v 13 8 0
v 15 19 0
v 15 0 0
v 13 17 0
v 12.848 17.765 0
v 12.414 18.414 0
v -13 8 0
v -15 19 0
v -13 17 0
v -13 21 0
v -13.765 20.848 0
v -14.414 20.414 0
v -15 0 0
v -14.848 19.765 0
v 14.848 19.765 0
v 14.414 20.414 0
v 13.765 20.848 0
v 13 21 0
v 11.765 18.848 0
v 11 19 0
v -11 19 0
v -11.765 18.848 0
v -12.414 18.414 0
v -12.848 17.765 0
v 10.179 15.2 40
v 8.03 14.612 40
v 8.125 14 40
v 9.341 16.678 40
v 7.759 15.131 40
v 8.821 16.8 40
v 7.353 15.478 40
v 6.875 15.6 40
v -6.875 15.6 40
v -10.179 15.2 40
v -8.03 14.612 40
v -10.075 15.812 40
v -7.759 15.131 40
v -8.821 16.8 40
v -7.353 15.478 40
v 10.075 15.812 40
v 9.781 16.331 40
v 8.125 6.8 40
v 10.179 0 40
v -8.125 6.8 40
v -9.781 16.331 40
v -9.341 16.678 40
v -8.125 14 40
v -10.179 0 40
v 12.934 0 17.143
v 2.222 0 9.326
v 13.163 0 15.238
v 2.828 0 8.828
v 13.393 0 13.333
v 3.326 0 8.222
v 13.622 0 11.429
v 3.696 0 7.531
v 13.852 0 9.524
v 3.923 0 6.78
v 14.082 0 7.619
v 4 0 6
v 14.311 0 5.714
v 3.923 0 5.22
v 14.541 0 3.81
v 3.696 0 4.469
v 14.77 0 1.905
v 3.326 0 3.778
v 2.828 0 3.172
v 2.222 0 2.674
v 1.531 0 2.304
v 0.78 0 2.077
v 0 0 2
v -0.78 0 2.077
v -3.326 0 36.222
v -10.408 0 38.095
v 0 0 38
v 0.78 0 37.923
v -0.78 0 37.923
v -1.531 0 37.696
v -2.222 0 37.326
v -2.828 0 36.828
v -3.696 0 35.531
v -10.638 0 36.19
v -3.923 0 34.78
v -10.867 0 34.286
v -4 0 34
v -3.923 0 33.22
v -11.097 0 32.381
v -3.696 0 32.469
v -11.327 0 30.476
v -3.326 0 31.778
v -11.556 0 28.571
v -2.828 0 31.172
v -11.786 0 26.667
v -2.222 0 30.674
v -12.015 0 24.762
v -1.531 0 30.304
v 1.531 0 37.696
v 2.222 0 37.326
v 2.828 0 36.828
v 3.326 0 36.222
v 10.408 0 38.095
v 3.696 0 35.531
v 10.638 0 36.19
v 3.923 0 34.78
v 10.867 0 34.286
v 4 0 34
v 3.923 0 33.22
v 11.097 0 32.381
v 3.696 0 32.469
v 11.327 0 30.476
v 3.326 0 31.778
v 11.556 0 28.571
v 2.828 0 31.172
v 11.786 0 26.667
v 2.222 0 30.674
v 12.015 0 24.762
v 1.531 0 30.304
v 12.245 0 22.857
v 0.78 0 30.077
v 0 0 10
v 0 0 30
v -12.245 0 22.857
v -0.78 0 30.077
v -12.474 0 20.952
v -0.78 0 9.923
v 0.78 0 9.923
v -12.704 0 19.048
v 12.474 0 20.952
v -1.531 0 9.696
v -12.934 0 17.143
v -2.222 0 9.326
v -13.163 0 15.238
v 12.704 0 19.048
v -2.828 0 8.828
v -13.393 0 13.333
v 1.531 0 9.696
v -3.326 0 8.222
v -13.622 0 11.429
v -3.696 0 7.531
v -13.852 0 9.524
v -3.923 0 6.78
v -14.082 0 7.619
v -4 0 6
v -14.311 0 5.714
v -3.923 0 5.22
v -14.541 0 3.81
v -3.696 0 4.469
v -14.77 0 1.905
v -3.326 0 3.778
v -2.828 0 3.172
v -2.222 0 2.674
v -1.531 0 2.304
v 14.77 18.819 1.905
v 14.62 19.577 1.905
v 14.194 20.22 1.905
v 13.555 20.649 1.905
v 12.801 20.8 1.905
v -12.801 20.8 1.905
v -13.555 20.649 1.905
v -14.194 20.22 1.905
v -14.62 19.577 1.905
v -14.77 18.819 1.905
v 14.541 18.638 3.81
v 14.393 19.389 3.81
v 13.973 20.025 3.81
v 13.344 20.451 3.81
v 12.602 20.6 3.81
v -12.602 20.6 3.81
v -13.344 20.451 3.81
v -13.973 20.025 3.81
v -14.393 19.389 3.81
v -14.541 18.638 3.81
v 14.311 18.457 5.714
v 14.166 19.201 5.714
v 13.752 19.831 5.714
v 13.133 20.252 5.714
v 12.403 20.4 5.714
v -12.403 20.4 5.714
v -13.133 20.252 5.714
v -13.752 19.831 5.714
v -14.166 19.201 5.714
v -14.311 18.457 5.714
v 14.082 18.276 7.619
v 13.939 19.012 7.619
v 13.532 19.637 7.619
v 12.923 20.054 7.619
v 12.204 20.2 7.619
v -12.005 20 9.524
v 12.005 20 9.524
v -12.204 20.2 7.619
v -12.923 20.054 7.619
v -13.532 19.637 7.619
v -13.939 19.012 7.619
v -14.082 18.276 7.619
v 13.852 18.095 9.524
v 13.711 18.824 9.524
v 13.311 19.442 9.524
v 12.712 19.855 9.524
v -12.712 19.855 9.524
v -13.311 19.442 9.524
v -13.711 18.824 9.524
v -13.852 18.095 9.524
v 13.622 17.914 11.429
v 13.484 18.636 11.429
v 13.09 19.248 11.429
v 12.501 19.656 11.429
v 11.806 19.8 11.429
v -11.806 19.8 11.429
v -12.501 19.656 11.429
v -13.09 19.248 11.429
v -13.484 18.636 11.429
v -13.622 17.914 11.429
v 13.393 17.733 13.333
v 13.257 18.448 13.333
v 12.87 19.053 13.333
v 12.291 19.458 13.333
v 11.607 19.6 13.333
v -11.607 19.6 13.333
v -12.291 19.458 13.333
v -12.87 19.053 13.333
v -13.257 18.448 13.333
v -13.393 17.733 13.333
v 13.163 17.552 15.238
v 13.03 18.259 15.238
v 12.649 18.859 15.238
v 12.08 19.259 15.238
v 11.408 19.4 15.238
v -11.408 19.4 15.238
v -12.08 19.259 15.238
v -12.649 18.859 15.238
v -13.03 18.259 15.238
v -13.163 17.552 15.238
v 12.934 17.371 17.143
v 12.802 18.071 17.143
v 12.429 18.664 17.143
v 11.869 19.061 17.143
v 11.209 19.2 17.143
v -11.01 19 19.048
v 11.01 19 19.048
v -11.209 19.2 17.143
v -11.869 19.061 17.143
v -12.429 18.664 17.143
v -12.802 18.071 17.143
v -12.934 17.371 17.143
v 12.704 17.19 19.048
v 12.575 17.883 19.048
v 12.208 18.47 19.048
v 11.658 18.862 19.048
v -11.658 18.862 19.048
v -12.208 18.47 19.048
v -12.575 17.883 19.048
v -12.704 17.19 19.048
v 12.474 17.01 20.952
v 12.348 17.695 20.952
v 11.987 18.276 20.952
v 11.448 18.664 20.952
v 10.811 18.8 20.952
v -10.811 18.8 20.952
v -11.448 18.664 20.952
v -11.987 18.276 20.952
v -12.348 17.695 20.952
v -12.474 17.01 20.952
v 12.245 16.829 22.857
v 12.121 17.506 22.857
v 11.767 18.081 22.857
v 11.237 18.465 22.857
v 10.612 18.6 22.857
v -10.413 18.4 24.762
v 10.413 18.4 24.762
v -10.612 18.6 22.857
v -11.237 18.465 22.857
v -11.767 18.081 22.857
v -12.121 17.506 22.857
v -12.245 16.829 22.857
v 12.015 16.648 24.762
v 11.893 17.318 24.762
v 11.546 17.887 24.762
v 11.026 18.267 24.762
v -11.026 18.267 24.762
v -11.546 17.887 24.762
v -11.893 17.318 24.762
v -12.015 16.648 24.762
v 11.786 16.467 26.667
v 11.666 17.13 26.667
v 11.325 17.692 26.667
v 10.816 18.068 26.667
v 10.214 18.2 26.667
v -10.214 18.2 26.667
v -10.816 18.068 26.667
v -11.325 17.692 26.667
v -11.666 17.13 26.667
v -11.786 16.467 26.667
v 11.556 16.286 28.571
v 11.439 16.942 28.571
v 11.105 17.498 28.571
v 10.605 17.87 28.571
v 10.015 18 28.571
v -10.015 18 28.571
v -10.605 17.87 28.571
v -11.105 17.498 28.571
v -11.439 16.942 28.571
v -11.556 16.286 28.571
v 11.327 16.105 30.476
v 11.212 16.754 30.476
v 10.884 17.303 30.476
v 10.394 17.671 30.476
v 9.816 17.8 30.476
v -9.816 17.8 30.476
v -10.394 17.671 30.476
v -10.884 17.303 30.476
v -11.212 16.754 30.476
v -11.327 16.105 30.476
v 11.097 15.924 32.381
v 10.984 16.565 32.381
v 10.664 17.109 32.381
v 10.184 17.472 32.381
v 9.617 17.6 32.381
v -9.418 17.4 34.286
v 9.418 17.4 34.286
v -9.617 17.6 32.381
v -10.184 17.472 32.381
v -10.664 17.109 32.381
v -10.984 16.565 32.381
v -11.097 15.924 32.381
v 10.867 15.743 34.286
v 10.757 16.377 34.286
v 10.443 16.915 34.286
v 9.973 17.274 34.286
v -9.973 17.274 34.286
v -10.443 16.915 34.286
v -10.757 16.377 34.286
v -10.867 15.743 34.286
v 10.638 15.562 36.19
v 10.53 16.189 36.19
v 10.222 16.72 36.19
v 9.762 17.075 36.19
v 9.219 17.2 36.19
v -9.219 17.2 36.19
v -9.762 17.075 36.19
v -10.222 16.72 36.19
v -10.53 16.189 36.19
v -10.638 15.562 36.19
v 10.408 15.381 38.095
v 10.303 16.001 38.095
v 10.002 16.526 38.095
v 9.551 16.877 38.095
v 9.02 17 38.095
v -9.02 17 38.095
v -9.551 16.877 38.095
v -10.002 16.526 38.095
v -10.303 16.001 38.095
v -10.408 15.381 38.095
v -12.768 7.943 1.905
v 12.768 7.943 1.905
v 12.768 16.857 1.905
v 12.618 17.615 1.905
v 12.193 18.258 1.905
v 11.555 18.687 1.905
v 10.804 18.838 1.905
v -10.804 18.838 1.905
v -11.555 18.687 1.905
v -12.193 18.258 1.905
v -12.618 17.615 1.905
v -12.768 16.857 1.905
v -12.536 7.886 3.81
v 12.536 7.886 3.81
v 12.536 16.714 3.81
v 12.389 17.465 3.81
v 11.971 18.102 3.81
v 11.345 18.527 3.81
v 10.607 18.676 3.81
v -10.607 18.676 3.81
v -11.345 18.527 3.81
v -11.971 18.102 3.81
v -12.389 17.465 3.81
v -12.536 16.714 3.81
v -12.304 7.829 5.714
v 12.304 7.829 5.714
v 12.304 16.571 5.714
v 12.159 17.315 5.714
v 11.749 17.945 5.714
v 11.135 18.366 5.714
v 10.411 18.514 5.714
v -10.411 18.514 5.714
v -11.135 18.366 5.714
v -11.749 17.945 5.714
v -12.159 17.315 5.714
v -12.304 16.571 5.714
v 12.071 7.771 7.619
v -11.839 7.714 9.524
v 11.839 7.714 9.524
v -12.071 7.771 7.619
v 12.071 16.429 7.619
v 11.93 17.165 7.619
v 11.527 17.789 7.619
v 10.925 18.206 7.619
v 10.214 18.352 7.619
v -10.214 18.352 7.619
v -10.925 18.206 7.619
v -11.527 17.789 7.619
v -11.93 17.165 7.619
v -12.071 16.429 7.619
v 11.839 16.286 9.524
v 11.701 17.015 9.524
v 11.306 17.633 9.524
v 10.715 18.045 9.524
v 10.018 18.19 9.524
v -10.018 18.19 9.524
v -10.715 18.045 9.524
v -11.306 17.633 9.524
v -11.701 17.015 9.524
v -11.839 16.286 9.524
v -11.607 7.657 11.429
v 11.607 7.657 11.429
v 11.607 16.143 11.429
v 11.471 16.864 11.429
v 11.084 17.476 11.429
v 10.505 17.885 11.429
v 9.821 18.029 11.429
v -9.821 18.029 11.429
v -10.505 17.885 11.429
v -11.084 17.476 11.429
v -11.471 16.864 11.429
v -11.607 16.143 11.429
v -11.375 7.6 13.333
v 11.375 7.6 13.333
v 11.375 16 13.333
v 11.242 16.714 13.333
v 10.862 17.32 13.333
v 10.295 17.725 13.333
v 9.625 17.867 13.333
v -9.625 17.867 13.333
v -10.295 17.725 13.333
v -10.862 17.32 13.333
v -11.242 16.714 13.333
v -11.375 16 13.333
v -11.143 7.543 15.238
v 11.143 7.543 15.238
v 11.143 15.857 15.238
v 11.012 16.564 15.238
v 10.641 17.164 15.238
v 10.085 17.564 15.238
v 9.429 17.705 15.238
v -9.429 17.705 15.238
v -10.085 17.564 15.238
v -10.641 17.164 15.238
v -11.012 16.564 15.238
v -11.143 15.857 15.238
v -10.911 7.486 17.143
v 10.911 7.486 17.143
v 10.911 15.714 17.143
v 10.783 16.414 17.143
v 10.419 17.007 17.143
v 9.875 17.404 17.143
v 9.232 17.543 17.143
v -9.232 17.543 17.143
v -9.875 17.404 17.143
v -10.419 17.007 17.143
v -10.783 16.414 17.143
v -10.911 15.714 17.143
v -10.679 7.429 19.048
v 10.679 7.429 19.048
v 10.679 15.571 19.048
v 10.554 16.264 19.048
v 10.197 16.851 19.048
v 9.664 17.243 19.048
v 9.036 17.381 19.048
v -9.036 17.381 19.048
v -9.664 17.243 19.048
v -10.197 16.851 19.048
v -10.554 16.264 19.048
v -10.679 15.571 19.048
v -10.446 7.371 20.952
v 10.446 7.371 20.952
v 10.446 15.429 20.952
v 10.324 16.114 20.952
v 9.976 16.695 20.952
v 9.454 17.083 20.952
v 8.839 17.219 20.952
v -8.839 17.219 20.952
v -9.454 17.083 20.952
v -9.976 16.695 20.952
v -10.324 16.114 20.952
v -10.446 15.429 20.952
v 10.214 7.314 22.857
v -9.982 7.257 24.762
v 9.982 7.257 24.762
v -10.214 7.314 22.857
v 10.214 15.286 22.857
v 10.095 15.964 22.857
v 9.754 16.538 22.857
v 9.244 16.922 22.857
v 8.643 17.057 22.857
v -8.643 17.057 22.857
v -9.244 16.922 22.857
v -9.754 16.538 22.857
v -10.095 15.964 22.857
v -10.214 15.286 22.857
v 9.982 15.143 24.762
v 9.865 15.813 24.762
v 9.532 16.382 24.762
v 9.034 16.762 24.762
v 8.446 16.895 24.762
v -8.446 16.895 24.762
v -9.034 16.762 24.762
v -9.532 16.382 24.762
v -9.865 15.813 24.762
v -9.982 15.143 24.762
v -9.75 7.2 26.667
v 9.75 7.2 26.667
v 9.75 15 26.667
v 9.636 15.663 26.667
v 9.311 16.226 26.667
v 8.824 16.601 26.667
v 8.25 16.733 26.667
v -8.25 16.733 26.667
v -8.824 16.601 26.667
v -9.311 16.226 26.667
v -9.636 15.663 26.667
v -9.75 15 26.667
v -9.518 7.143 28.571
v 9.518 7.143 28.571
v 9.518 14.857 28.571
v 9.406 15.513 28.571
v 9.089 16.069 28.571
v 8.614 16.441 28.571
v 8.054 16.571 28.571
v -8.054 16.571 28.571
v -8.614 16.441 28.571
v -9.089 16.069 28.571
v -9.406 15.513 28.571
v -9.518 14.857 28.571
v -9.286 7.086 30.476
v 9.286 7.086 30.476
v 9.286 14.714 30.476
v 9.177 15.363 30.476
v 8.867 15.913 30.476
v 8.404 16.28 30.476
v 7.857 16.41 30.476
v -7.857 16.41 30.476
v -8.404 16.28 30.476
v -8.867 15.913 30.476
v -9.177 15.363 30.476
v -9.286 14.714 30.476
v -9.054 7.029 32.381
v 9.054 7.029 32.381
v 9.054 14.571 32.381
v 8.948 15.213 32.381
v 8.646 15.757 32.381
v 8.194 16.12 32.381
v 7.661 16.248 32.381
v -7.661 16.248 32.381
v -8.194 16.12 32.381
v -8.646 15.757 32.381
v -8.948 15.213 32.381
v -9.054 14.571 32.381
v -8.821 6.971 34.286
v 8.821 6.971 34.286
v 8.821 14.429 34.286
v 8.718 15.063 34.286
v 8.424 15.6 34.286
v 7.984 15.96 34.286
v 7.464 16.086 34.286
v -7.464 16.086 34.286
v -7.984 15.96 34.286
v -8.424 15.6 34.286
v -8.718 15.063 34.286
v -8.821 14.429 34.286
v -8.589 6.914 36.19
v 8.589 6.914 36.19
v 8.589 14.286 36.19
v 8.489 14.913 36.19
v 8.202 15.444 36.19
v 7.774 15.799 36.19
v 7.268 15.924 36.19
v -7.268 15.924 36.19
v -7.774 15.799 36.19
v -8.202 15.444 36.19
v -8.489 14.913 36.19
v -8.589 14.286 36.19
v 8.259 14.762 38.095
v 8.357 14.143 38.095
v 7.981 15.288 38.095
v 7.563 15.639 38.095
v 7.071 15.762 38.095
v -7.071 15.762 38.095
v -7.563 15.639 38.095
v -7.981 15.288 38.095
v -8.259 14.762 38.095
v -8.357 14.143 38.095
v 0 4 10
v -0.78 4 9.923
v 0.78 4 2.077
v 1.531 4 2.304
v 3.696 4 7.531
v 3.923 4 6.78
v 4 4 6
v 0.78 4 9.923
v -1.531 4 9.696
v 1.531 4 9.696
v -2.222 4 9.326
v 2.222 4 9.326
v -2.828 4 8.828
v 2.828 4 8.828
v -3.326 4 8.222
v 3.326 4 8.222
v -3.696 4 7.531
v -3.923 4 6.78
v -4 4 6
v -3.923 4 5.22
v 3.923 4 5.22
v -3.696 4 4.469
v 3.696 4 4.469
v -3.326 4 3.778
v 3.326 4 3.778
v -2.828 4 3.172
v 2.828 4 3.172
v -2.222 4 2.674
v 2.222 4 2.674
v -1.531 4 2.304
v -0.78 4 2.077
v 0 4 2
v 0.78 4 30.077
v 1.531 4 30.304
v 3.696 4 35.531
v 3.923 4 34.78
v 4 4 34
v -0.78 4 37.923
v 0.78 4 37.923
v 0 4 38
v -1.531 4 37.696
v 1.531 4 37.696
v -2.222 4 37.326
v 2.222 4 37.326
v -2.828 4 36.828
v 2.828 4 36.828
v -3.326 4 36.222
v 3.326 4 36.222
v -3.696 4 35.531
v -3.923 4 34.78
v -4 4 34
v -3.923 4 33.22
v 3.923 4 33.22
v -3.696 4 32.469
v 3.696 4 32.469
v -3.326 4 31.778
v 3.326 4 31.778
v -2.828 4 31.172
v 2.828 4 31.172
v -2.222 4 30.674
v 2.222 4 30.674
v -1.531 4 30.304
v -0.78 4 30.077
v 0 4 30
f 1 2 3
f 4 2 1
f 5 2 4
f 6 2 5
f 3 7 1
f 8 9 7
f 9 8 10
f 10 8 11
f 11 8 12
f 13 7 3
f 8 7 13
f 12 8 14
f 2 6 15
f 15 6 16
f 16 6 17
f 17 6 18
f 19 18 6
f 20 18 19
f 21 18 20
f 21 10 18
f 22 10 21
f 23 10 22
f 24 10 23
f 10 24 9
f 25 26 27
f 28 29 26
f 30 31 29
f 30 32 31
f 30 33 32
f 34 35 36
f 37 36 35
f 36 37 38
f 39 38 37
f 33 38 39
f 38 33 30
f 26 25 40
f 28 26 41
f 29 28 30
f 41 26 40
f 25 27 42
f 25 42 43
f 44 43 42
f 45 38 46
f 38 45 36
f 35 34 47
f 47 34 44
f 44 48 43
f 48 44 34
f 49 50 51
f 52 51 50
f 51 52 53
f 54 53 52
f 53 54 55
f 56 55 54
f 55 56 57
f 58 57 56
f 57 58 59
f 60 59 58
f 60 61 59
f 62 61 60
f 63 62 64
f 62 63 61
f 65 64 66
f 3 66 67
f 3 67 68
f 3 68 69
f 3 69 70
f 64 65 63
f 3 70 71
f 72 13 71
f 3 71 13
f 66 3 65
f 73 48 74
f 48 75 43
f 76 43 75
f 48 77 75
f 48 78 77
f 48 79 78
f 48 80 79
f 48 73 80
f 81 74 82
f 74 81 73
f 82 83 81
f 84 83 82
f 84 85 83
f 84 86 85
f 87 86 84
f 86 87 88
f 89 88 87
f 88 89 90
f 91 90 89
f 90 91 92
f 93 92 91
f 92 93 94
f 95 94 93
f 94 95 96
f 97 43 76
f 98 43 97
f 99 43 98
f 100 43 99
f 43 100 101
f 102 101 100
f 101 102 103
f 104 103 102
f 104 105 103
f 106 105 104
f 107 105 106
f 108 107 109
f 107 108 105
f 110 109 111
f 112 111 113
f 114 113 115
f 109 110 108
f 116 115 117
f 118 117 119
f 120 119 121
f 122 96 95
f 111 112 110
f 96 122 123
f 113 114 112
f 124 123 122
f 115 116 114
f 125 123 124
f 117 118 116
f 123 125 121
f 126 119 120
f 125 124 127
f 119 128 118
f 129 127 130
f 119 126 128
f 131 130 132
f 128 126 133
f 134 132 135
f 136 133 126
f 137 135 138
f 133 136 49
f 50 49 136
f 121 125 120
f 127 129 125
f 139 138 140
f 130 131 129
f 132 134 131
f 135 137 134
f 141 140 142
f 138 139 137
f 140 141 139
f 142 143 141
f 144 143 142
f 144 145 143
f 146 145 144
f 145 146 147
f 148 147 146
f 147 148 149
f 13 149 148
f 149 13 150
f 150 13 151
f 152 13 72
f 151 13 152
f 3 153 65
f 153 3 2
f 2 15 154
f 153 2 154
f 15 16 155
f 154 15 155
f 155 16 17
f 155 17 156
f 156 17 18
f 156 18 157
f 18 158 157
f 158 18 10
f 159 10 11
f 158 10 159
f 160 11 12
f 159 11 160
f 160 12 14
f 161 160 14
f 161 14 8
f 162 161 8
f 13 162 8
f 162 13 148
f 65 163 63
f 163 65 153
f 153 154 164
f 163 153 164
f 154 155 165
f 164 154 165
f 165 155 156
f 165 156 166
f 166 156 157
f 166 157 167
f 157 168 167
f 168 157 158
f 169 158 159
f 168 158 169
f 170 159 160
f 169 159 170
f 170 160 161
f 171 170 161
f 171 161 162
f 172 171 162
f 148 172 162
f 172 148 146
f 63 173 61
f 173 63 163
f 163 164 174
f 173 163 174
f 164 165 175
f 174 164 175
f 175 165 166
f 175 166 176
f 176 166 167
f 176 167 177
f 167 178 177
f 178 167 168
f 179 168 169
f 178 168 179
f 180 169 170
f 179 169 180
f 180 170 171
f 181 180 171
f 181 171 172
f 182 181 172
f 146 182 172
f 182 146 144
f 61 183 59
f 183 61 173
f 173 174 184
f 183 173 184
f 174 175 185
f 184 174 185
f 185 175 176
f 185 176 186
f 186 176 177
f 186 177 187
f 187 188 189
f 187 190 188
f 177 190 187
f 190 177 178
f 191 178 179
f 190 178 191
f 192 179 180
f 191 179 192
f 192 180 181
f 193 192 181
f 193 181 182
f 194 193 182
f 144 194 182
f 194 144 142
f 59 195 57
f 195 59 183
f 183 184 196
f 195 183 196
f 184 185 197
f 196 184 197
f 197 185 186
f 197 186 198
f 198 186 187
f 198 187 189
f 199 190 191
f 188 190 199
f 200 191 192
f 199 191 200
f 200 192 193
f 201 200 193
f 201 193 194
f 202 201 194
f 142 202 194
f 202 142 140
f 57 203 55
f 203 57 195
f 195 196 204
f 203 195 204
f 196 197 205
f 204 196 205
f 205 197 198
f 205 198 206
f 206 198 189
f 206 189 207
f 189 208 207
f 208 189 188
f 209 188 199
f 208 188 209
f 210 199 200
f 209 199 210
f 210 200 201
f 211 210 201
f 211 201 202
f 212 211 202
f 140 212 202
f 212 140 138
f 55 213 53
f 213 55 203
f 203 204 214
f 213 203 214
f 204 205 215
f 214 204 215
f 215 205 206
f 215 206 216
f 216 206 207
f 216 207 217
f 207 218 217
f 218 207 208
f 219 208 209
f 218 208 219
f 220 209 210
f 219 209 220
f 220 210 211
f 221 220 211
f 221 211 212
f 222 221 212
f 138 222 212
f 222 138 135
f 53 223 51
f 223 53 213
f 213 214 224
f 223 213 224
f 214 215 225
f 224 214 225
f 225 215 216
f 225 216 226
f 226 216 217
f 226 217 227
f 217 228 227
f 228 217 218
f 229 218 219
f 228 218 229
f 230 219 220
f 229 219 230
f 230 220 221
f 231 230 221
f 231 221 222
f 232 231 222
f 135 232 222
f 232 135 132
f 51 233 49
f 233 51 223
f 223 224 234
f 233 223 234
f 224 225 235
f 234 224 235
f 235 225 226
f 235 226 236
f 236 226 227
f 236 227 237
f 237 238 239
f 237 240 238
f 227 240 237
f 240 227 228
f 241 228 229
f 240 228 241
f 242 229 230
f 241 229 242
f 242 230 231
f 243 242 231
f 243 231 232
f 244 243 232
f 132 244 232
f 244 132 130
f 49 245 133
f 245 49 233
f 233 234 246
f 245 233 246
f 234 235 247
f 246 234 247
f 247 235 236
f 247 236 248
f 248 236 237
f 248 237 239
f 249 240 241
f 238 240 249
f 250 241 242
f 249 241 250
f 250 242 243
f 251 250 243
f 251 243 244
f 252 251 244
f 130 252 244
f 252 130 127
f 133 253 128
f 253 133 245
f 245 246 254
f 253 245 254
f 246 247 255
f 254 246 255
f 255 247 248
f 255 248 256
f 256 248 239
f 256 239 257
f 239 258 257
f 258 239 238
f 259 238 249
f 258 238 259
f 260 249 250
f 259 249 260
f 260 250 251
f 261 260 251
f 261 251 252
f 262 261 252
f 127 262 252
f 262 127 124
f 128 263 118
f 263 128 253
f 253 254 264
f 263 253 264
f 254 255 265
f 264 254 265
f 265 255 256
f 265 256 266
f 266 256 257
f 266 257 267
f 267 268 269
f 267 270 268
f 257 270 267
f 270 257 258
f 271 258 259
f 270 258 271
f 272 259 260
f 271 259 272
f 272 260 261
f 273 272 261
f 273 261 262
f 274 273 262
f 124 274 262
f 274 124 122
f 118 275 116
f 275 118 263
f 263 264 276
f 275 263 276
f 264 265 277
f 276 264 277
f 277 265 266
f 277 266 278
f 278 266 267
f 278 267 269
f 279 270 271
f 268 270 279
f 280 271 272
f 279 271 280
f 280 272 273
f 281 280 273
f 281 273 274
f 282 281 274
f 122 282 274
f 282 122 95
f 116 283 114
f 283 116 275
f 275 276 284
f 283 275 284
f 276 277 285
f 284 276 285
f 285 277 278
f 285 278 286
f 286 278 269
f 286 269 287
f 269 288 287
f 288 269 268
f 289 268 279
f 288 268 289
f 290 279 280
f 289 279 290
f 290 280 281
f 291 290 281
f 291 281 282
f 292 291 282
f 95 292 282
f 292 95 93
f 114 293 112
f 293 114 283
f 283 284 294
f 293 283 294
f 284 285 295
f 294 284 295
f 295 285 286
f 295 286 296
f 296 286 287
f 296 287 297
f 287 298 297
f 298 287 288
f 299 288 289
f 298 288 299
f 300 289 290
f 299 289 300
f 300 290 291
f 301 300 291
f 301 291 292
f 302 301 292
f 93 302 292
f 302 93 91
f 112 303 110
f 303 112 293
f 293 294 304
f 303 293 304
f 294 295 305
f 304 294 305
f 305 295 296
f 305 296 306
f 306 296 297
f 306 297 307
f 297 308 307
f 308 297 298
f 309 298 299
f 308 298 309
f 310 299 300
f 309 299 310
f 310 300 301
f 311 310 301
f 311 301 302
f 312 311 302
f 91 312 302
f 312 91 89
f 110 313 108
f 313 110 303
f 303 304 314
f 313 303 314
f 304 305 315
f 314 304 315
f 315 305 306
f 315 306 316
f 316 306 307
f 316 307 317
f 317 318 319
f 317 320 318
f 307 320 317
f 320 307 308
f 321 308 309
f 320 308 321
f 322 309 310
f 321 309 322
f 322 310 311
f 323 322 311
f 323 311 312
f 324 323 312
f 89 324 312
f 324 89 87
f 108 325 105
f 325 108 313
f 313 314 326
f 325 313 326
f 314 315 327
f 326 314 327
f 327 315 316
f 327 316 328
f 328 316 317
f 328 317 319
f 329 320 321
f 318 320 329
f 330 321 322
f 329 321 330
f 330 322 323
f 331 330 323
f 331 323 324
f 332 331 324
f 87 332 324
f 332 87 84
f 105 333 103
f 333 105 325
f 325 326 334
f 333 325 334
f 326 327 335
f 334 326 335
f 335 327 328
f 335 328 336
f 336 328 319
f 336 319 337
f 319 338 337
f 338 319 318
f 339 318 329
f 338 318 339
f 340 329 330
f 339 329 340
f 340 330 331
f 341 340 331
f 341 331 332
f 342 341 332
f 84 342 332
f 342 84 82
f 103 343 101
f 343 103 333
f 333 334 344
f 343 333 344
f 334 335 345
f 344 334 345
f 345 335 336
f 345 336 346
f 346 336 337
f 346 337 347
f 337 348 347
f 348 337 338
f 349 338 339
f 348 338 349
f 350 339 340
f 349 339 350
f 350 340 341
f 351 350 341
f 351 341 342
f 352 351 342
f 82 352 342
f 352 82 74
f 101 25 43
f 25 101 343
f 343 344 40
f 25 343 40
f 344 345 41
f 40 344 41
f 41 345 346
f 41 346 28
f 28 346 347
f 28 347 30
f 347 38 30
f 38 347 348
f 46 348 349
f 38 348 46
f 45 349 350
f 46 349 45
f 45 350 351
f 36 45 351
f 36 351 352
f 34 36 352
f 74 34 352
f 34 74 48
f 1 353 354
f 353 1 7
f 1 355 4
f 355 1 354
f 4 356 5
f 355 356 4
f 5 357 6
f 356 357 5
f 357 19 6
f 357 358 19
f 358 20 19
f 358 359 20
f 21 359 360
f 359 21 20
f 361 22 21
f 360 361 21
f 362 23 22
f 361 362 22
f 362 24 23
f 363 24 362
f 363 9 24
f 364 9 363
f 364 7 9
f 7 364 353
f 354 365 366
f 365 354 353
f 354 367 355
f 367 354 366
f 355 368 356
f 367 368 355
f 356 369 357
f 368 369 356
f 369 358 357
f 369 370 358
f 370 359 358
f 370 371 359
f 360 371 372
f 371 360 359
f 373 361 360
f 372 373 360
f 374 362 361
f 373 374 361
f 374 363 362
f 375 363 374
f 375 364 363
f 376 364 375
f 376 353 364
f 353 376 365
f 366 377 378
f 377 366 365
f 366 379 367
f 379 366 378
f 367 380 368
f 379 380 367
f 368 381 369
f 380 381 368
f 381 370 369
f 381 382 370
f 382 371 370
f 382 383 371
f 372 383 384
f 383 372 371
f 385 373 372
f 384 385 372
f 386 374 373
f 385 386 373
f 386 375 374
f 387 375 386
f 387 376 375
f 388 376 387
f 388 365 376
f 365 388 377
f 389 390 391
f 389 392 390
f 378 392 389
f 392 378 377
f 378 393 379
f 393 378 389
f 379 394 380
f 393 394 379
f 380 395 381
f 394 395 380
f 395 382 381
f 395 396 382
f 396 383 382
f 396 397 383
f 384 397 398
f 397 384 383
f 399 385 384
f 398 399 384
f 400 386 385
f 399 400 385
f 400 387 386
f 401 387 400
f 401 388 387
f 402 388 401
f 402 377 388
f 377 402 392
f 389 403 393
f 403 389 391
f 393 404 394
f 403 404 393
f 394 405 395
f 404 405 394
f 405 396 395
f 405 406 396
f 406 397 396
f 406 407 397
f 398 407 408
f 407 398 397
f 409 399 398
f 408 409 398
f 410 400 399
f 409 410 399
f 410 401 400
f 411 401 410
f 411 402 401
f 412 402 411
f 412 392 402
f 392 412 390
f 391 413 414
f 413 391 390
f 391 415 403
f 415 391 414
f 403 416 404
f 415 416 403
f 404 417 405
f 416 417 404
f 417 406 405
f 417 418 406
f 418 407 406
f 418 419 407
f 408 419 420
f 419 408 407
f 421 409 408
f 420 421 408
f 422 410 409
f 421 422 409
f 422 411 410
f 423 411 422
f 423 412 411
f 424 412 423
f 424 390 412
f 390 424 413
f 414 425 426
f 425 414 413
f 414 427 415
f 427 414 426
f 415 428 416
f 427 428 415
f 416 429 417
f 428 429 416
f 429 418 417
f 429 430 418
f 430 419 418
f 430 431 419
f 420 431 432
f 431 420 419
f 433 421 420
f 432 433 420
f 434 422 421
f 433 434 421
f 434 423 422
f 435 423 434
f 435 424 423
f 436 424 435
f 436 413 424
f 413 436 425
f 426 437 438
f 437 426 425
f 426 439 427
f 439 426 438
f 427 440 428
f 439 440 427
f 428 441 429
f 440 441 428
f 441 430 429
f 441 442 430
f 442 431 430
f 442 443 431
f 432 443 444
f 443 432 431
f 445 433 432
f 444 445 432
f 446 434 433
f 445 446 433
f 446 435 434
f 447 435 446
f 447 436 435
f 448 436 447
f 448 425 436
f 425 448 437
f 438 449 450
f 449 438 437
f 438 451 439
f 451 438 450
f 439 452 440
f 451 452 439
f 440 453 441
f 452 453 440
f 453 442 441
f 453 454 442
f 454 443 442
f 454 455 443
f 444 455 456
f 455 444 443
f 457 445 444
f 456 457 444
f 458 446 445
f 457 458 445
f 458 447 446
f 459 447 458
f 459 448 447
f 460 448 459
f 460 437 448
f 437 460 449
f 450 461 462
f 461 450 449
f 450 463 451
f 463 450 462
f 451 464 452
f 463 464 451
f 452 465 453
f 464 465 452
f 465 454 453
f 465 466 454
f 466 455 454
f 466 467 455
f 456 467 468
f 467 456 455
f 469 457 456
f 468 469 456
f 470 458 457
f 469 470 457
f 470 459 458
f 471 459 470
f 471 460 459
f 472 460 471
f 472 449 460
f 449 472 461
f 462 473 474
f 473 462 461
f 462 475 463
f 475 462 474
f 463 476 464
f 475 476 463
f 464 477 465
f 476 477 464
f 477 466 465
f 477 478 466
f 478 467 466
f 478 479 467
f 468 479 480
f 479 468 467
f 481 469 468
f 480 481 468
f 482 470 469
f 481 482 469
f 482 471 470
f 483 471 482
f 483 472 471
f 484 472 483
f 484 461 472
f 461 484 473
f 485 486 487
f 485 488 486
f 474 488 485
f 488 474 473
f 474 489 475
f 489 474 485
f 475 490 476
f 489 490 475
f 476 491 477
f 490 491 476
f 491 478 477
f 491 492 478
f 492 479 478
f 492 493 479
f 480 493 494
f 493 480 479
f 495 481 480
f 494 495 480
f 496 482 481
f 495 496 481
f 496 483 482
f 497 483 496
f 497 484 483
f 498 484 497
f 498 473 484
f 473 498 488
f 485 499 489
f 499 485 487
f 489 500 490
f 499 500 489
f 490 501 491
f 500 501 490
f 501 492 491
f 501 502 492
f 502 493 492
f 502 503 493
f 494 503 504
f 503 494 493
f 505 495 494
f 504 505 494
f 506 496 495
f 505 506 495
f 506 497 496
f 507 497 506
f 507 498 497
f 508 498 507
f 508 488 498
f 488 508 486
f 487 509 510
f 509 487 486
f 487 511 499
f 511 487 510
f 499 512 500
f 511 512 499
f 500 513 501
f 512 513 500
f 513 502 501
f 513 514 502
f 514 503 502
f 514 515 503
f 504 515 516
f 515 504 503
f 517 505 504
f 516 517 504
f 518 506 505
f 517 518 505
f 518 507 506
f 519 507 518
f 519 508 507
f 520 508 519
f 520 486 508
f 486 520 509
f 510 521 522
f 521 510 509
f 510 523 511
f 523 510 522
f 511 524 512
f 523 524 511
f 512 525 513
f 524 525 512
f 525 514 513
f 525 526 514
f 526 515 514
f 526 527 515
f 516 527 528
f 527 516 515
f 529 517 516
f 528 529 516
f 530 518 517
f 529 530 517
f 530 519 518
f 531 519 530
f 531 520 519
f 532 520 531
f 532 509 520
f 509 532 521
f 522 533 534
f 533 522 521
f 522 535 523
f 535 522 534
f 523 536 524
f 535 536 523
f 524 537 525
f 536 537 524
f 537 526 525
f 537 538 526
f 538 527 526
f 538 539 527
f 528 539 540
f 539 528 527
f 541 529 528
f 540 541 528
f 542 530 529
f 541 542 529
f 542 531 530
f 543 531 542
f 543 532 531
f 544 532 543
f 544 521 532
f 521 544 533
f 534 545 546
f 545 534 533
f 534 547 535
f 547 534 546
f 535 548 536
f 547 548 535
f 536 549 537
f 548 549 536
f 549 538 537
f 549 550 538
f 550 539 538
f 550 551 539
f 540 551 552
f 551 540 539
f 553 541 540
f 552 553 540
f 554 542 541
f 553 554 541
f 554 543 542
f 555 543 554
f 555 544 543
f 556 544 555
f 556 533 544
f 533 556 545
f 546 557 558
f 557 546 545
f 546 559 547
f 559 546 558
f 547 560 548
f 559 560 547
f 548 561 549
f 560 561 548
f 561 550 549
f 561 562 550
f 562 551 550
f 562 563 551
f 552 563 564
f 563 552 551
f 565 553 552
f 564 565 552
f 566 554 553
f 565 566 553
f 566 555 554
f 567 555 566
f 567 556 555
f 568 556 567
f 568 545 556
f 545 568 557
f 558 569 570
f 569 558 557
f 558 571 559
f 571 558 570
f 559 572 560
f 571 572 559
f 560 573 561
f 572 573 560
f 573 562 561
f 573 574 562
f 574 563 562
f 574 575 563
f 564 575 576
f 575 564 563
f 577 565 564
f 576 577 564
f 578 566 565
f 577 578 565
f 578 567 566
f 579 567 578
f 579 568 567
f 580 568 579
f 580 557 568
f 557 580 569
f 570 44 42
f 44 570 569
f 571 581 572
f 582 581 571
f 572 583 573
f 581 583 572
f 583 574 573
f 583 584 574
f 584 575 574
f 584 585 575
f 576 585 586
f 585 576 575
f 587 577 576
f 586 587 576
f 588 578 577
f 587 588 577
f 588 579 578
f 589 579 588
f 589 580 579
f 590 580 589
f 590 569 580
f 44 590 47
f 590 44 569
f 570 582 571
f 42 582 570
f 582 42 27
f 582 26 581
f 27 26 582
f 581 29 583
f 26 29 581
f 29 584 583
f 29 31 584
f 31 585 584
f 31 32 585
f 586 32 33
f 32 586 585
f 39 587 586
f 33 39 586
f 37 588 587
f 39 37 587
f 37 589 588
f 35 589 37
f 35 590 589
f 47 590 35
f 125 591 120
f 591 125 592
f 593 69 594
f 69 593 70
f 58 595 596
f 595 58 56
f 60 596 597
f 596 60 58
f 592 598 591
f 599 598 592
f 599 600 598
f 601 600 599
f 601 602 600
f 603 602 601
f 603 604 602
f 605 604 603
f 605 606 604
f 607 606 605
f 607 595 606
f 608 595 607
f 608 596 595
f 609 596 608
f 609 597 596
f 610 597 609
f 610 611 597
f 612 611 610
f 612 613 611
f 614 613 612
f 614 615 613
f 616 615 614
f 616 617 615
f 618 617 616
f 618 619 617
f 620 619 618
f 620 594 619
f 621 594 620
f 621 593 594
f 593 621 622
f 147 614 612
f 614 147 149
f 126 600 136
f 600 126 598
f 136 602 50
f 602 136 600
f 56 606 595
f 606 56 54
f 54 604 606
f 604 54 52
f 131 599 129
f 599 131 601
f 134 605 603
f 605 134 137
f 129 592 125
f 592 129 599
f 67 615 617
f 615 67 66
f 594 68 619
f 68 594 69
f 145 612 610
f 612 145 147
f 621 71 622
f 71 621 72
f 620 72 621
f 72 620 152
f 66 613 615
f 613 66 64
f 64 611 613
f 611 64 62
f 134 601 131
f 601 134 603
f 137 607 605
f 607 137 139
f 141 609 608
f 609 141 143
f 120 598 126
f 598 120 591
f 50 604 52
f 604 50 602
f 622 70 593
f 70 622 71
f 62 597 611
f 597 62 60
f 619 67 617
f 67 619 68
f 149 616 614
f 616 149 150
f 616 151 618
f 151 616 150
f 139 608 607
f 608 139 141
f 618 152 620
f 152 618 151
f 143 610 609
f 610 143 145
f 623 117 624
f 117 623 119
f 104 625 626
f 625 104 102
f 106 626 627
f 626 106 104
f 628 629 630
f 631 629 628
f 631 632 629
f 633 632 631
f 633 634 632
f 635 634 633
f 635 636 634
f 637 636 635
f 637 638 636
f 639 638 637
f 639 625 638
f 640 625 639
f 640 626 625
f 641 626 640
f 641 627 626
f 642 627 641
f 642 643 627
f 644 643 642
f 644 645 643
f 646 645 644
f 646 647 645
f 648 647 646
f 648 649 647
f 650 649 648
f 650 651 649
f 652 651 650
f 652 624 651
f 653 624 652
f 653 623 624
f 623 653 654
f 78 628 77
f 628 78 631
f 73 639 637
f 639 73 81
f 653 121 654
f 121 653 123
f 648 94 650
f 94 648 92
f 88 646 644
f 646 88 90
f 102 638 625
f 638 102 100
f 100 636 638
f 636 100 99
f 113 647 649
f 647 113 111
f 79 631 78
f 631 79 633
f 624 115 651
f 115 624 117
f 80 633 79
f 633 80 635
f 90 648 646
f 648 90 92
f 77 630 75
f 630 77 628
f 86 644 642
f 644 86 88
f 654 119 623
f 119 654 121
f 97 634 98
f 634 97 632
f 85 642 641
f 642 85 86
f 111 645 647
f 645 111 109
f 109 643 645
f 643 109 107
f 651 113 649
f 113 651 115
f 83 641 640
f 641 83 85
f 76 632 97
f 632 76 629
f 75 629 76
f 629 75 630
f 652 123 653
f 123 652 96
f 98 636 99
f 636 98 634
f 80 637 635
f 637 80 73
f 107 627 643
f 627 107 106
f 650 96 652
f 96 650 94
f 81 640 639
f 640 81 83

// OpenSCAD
// Copyright (C) 2016-2017 - Olivier Podevin <hillheaven@free.fr>
//
// Content: An universal magnetic scissors holder.
//
//
// The script below has the following parameters:
//      - holder height
//      - holder_wall_thickness
//      - scissors upper width
//      - scissors lower width
//      - scissors thickness
//      - magnets diameter
//      - magnets thickness
//
// Advice on parameters' value: while measuring your scissors,
//     provide some space to the scissors to let it float in the holder.
//
// This file is an OpenSCAD script, see <http://www.openscad.org/> for details
//
// This work is licensed under the Creative Commons Attribution 4.0
// International license. To view a copy of this license, visit
// <http://creativecommons.org/licenses/by/4.0/>.

// Parameters in millimeters
holder_height = 40;
holder_wall_thickness = 2;
scissors_upper_width = 24;
scissors_lower_width = 15;
scissors_thickness = 11;
magnets_diameter = 8;
magnets_thickness = 4;

// Global variables
total_holder_thickness = scissors_thickness + magnets_thickness + holder_wall_thickness * 3;

module magnet_hole() 
{
    cylinder(r = magnets_diameter / 2, h = magnets_thickness, $fn=32);
}

module body_mass() 
{
    // Holder thickness = scissor thickness + magnet thickness + some matter between magnets and scissors + thickness to hold the scissors.
    upper_width = scissors_upper_width + holder_wall_thickness * 2;
    lower_width = scissors_lower_width + holder_wall_thickness * 2;
    
    linear_extrude(height = holder_height, scale=[lower_width/upper_width, 0.8])
        hull() {
            translate([upper_width / 2 - 1,0,0])
                square(size = [2,2]);
            translate([-upper_width / 2 - 1,0,0])
                square(size = [2,2]);
            translate([upper_width / 2 - 1, total_holder_thickness - 2,0])
                circle(2, $fn=16);
            translate([-upper_width / 2 + 1, total_holder_thickness - 2,0])
                circle(2, $fn=16);
        }
}

module body_hole() 
{
    upper_width = scissors_upper_width;
    lower_width = scissors_lower_width;
    
    linear_extrude(height = holder_height, scale=[lower_width/upper_width, 0.8])
        hull() {
            translate([upper_width / 2 - 1, magnets_thickness + holder_wall_thickness,0])
                square(size = [2,2]);
            translate([-upper_width / 2 - 1,magnets_thickness + holder_wall_thickness,0])
                square(size = [2,2]);
            translate([upper_width / 2 - 1, scissors_thickness - 2 + magnets_thickness + holder_wall_thickness,0])
                circle(2, $fn=16);
            translate([-upper_width / 2 + 1, scissors_thickness - 2 + magnets_thickness + holder_wall_thickness,0])
                circle(2, $fn=16);
        }
}

module body() 
{
    difference() {
        body_mass();
        translate([0,holder_wall_thickness,0])
            body_hole();        
        rotate([90,0,0])
            translate([0,magnets_diameter / 2 + holder_wall_thickness,-magnets_thickness])
                magnet_hole();        
        rotate([90,0,0])
            translate([0,holder_height - (magnets_diameter / 2 + holder_wall_thickness),-magnets_thickness])
                magnet_hole();        
    }
}
body();
